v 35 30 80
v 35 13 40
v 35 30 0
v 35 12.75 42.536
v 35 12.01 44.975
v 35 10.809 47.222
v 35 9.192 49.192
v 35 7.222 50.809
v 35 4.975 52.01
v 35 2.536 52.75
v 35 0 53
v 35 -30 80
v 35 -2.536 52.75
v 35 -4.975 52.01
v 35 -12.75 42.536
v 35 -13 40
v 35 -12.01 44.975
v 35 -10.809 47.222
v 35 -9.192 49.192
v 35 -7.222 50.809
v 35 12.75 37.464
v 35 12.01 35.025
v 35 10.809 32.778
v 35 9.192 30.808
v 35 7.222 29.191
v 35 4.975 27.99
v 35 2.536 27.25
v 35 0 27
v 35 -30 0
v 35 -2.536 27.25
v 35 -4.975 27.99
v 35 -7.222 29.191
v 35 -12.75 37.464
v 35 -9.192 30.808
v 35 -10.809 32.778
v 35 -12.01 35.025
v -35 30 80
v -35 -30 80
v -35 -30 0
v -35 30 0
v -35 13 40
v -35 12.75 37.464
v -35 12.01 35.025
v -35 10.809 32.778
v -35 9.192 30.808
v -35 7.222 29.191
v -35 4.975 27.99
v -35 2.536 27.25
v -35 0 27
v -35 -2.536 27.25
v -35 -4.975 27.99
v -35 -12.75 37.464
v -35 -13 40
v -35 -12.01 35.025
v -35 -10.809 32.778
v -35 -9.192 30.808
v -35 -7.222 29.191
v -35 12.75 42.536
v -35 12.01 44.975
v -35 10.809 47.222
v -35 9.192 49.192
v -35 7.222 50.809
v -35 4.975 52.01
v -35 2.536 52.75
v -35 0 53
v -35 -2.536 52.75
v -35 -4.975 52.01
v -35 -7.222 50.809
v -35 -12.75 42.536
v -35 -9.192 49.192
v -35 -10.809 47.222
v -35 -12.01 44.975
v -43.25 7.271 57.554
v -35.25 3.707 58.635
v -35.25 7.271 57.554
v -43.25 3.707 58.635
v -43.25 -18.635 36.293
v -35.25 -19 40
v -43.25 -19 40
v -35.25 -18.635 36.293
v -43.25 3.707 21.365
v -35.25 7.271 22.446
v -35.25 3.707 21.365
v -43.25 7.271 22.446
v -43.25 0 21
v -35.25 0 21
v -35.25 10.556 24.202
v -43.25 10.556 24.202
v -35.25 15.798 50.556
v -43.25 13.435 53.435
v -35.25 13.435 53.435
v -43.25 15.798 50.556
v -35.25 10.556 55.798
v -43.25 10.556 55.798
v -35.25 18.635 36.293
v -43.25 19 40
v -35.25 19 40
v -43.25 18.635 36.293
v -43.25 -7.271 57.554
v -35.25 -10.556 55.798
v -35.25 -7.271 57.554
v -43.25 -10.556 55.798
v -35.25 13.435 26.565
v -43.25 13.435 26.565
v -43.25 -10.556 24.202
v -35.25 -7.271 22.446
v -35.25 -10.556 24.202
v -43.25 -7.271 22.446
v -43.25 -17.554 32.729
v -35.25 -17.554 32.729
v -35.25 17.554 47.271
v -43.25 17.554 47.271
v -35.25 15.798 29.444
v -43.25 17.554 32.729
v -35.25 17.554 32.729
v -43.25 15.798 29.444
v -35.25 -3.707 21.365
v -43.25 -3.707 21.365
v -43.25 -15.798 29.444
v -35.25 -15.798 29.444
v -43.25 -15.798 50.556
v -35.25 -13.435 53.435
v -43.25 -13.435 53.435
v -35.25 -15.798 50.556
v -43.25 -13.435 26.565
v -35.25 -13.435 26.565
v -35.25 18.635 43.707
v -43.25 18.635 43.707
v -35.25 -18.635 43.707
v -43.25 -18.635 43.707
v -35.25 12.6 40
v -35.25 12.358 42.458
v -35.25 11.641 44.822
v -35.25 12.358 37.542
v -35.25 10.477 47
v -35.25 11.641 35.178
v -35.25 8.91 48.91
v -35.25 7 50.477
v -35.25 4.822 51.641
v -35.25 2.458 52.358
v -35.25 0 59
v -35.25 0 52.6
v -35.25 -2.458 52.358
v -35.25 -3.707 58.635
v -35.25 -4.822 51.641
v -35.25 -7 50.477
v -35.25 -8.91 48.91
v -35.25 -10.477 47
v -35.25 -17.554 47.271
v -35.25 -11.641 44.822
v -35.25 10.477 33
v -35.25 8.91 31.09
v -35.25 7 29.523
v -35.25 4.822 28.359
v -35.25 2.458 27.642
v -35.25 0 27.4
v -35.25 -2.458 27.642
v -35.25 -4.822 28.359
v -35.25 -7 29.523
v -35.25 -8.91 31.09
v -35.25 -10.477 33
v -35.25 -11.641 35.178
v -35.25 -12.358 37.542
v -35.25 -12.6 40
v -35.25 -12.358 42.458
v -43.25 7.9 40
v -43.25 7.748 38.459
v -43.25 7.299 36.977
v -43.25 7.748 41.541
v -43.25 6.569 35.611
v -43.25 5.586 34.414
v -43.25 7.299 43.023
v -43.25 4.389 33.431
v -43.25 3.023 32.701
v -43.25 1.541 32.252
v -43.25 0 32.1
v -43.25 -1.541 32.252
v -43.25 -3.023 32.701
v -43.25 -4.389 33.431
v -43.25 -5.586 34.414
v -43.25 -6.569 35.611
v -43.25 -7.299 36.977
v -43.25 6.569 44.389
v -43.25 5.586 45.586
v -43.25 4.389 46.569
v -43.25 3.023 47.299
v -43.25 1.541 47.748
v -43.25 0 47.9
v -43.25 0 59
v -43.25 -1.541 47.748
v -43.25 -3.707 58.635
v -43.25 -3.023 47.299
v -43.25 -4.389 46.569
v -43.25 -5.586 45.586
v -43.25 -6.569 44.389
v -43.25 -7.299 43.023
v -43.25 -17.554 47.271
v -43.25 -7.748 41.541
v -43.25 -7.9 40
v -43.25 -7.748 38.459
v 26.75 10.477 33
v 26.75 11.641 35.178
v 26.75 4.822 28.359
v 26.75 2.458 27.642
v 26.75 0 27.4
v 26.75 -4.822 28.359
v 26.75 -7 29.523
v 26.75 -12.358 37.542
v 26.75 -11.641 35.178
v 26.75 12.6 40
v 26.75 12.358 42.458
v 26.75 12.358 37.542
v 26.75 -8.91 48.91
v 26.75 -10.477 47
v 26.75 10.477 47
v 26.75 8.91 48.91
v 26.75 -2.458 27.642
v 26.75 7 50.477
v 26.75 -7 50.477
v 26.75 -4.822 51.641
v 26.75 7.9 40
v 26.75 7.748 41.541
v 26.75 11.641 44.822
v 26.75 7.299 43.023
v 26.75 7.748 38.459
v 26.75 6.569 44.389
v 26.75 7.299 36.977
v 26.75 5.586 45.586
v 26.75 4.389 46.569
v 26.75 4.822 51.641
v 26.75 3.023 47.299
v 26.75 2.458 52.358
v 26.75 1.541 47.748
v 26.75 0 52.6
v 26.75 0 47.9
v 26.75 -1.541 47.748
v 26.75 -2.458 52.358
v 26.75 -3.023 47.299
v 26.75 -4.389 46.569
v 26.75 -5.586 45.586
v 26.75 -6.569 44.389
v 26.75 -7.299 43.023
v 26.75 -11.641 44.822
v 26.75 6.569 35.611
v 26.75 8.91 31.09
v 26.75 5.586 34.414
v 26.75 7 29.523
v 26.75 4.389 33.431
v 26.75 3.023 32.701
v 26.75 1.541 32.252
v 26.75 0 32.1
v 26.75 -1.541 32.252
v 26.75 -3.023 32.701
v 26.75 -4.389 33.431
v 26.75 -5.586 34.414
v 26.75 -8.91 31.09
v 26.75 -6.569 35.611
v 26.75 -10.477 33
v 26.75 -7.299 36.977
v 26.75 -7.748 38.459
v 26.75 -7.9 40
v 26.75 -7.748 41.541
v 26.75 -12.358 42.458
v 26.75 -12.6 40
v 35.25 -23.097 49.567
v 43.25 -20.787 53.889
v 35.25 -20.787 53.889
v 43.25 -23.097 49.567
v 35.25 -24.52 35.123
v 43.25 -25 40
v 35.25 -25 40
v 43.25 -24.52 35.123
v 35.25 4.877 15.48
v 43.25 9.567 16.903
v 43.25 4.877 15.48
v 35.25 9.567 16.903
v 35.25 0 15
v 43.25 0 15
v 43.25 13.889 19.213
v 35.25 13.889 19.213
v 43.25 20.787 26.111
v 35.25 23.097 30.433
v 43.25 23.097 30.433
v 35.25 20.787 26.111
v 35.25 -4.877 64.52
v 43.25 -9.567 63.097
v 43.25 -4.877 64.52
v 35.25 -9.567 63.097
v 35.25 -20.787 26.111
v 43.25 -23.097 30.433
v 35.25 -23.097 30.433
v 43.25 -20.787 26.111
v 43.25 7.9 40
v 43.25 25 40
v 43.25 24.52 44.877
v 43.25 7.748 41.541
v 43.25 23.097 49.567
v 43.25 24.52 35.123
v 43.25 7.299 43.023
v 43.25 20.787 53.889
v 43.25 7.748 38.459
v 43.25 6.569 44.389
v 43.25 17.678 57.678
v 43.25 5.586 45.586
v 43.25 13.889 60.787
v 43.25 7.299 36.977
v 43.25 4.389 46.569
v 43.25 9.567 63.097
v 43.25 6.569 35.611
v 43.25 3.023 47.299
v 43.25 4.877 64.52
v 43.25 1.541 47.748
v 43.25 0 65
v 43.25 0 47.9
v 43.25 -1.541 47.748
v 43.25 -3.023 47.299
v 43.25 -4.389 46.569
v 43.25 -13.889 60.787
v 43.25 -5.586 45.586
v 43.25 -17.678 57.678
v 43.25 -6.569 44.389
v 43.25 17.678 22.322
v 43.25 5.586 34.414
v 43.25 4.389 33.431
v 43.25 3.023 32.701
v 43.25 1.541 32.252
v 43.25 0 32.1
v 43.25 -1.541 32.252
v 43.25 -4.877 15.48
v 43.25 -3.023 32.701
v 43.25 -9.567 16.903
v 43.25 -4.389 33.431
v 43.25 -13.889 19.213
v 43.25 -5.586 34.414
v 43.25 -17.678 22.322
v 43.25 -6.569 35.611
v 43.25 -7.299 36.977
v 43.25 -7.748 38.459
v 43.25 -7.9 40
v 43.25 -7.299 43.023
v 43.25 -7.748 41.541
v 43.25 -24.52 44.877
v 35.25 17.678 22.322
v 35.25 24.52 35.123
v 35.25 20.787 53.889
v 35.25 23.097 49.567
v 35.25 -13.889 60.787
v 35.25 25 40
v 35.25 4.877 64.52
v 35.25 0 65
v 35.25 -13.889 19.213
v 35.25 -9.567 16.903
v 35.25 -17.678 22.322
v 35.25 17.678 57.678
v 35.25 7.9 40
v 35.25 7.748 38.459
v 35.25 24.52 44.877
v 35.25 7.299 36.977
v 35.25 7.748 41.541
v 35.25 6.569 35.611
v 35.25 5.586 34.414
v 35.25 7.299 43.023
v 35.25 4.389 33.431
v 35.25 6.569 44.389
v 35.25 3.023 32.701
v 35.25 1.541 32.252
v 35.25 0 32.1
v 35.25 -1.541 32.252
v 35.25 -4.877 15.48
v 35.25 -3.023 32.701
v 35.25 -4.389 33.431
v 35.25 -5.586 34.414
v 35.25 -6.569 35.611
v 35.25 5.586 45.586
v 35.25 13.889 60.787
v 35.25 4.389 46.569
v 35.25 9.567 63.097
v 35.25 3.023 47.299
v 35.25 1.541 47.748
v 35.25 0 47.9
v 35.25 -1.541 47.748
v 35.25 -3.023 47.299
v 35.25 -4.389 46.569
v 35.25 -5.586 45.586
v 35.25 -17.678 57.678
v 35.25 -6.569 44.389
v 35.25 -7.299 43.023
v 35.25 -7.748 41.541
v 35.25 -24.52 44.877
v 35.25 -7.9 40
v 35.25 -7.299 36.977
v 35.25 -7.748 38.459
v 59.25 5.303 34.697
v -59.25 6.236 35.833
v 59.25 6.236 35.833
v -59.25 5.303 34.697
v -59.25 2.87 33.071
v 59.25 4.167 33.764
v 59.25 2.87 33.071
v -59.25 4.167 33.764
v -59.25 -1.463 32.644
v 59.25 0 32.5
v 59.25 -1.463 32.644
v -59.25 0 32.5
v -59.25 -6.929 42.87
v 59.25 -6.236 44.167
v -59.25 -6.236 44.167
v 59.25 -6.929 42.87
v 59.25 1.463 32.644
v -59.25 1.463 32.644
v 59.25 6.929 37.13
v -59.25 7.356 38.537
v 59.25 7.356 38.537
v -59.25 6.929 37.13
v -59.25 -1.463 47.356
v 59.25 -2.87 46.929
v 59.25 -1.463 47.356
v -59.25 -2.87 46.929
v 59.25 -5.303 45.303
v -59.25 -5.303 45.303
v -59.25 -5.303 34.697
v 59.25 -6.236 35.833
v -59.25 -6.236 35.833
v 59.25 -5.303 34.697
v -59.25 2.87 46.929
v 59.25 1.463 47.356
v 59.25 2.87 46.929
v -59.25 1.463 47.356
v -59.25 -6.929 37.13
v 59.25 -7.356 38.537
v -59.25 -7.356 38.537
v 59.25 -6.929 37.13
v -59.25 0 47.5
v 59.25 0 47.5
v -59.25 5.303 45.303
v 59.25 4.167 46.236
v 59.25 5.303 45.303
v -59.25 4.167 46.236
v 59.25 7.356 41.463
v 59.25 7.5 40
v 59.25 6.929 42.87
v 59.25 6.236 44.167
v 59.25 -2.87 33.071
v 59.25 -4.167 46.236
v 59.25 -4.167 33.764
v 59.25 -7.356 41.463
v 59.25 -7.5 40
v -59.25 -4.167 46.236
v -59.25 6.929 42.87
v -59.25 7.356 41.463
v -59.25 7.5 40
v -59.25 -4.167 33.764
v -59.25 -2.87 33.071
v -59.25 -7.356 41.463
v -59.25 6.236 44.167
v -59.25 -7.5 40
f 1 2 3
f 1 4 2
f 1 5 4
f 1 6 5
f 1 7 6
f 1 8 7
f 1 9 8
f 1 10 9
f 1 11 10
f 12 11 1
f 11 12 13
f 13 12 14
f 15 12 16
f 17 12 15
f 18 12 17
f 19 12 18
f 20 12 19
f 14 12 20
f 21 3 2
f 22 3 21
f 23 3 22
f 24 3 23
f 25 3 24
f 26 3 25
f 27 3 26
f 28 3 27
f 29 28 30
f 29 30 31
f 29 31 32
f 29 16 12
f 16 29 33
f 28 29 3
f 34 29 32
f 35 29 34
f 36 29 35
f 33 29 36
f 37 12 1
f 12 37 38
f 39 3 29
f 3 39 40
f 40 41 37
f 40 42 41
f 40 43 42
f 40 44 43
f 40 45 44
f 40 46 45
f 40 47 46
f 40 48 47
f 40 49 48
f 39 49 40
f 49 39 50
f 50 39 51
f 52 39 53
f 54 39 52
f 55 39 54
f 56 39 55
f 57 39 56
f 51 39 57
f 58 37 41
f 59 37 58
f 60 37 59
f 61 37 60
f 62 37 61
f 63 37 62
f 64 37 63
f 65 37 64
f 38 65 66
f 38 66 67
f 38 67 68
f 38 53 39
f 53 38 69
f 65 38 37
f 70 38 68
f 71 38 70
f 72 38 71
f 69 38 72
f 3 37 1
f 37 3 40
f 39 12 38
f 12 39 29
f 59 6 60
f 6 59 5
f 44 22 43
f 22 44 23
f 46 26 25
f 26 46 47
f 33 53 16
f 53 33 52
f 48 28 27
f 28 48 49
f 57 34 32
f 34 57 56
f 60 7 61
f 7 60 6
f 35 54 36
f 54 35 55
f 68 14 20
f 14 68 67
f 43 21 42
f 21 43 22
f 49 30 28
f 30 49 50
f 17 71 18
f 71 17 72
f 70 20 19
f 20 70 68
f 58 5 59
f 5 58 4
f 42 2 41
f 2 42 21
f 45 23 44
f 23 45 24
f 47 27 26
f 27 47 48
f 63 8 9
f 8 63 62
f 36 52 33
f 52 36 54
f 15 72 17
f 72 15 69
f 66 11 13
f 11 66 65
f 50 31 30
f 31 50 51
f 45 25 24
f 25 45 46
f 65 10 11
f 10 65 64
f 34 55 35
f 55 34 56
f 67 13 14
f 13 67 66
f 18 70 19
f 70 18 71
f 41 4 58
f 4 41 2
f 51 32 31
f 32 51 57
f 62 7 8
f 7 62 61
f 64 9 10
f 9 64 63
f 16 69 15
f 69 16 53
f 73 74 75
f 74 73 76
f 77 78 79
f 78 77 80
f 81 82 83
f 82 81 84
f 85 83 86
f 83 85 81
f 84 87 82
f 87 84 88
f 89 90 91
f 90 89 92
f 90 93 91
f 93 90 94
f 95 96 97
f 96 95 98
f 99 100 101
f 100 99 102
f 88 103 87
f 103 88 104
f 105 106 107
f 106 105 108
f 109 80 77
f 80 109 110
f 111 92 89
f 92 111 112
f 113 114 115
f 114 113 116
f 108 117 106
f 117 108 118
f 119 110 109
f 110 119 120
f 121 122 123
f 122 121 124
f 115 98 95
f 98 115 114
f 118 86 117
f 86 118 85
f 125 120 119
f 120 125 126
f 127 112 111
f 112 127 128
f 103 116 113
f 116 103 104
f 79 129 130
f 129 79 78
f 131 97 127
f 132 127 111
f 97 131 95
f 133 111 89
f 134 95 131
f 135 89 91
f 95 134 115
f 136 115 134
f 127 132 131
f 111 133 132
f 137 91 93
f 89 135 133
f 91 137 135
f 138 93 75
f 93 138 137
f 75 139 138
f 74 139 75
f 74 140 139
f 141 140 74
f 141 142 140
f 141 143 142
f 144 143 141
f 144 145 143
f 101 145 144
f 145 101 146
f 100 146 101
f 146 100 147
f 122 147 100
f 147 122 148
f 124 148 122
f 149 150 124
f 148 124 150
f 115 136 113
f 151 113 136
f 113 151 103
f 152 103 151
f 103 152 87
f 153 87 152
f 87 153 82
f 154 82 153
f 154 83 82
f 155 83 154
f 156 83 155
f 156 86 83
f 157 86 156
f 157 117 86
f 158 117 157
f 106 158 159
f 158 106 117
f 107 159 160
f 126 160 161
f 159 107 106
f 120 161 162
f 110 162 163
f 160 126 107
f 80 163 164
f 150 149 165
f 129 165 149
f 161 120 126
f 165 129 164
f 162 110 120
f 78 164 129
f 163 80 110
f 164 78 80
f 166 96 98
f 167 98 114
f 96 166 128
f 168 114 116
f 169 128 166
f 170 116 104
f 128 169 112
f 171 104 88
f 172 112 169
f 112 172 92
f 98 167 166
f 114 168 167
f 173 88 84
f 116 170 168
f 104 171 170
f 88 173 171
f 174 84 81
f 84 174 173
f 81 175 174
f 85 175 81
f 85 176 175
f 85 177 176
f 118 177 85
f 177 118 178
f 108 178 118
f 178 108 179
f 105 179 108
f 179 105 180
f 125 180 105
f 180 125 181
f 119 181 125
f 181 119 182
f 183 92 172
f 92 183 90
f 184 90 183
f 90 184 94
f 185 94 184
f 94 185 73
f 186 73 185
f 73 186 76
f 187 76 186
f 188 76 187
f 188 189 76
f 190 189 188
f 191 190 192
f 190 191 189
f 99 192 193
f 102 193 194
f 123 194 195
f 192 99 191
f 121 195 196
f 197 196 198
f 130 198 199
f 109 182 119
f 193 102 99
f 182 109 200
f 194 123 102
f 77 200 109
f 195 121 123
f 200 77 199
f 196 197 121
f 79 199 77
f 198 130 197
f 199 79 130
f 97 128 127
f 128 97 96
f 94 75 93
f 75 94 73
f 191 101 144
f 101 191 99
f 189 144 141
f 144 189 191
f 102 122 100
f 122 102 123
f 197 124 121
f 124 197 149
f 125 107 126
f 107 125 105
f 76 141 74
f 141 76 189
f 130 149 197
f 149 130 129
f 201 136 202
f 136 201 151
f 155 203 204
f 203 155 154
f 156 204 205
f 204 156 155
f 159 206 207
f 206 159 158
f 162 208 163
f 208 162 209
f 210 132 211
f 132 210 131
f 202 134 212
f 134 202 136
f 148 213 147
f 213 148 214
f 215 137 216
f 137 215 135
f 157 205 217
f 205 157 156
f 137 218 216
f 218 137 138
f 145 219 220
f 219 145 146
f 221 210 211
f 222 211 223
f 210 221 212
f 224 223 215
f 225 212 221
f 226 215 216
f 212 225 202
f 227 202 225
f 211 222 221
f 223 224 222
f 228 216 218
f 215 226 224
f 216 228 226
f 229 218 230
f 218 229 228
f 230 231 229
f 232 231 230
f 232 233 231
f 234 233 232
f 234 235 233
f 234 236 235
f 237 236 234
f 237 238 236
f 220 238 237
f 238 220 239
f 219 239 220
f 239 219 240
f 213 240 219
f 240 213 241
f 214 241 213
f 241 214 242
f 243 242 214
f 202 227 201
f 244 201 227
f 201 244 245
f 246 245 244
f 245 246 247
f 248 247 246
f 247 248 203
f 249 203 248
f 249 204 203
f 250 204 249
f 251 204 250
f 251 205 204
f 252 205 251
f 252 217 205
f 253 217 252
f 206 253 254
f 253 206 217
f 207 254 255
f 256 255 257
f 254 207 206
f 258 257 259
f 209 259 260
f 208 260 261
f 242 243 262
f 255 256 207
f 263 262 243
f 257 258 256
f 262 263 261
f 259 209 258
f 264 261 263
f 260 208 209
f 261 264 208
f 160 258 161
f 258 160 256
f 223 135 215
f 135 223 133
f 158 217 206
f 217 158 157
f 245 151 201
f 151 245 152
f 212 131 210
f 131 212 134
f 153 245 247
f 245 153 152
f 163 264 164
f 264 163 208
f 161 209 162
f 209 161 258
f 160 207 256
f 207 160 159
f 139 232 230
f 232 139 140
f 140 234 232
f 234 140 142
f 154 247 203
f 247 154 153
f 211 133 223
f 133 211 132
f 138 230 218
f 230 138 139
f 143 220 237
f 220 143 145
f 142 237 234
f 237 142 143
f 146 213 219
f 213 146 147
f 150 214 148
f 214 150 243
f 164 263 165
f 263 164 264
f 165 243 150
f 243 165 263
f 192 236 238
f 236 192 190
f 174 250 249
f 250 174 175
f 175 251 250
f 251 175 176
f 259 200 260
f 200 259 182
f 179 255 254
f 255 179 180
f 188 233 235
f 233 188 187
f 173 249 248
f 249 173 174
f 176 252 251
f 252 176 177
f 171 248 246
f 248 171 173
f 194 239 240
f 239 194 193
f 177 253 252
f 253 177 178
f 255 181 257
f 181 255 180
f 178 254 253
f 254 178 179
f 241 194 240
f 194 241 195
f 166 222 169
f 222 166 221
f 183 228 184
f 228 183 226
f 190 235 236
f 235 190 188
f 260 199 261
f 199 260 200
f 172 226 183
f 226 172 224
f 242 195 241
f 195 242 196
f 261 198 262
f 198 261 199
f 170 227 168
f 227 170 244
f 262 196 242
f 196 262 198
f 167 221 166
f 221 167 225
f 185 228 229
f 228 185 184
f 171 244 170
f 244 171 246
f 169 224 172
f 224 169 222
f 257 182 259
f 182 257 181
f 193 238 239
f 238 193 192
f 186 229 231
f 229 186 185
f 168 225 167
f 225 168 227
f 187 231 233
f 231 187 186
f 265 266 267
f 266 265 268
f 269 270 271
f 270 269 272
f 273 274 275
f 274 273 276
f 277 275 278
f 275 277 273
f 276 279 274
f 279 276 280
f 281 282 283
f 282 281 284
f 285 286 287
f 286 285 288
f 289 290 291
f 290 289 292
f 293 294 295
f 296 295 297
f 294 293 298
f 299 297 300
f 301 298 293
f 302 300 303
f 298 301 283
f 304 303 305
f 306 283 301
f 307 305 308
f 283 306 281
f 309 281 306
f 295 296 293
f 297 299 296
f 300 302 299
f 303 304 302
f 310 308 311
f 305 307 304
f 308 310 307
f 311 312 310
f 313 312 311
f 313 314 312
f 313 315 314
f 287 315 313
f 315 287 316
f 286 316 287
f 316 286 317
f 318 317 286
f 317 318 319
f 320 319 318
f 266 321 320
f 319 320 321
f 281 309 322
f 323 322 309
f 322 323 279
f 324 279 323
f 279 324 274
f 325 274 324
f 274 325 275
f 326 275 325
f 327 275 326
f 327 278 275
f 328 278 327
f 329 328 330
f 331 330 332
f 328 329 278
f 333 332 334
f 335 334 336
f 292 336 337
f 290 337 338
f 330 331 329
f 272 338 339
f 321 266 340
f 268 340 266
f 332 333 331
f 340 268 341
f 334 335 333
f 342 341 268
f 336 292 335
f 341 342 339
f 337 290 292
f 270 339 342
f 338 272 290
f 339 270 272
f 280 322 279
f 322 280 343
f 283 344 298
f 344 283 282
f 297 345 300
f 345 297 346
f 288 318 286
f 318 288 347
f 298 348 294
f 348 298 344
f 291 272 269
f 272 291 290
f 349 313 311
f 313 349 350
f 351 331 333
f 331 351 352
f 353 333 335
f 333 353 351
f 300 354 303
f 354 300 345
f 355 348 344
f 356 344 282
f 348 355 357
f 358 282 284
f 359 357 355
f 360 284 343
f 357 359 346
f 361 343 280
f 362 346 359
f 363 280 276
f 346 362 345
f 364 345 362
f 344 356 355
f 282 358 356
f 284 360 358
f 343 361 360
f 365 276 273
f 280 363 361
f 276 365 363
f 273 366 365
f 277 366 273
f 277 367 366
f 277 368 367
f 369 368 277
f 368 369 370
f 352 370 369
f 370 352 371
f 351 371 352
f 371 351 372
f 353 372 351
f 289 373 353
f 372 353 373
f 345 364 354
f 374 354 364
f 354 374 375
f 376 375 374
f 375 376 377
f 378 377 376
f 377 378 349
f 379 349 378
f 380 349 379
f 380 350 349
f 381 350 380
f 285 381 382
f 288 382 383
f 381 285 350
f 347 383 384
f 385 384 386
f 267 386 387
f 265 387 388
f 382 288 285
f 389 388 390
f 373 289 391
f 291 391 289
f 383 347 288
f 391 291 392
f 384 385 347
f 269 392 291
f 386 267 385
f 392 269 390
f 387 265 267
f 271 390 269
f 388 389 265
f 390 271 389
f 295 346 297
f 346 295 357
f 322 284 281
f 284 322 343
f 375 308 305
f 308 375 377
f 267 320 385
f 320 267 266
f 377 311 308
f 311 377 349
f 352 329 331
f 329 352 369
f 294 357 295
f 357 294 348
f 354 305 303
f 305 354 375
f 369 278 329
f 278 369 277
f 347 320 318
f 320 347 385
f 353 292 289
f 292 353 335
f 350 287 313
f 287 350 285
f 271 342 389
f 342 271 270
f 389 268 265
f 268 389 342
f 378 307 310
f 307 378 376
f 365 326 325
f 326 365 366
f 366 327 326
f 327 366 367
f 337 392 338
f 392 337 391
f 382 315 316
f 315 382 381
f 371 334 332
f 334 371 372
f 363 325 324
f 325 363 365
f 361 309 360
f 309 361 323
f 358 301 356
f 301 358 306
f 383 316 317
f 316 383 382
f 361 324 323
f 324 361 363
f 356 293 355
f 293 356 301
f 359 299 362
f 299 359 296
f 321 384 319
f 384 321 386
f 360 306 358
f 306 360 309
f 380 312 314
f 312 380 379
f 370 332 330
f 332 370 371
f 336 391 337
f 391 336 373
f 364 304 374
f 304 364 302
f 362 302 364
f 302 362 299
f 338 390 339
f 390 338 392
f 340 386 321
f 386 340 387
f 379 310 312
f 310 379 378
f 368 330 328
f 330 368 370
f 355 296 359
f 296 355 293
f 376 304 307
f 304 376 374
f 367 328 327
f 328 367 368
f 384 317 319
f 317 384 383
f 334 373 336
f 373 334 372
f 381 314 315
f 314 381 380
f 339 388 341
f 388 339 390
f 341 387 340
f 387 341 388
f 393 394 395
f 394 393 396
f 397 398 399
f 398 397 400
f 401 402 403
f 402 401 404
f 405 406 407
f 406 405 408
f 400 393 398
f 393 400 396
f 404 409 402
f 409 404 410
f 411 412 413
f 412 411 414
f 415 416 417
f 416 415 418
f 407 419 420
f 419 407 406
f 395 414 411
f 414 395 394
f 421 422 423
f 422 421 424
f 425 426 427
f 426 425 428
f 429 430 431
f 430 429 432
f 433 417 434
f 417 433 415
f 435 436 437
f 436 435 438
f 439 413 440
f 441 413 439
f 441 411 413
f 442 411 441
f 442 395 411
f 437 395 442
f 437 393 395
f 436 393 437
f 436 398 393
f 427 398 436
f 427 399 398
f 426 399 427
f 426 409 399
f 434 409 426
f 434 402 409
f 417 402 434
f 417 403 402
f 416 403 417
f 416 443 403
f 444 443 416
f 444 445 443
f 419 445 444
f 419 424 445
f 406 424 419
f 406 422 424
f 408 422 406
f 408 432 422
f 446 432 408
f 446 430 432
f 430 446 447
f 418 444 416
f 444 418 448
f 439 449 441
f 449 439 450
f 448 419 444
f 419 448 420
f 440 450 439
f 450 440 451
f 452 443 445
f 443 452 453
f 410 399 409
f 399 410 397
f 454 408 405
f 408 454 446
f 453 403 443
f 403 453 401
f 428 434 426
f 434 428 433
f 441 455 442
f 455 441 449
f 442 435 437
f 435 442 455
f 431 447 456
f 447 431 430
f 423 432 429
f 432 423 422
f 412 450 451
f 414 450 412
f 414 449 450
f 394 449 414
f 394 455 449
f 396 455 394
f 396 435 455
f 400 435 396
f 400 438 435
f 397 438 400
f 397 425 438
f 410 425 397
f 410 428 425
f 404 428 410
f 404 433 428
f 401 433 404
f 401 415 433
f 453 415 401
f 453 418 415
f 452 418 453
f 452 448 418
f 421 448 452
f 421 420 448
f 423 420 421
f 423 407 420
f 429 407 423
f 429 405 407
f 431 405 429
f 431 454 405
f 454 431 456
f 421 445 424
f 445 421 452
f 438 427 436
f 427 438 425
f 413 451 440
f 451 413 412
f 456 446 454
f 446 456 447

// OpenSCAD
$fn = 32;

// ------------------------------------------------------------------------
// Bushed housing: 70 x 60 x 80 mm housing, bushing d25.2
// Every part is its own module, assembly() places them once.
// ------------------------------------------------------------------------

// --- part 1 ---
module housing() {
  difference() {
    translate([-35, -30, 0]) cube([70, 60, 80]);
    translate([0, 0, 40]) rotate([0, 90, 0]) cylinder(h = 72, d = 26, center = true);
  }
}

// --- part 2 ---
module bushing() {
  difference() {
    union() {
      cylinder(h = 8, d = 38);
      translate([0, 0, 8]) cylinder(h = 62, d = 25.2);
    }
    translate([0, 0, -1]) cylinder(h = 72, d = 15.8);
  }
}

// --- part 3 ---
module shaft() {
  translate([0, 0, -59.25]) cylinder(h = 118.5, d = 15);
}

// --- part 4 ---
module cover() {
  difference() {
    cylinder(h = 8, d = 50);
    translate([0, 0, -1]) cylinder(h = 10, d = 15.8);
  }
}

// --- assembly ---
module assembly() {
  translate([0, 0, 0]) rotate([0, 0, 0]) housing();
  translate([-43.25, 0, 40]) rotate([0, 90, 0]) bushing();
  translate([0, 0, 40]) rotate([0, 90, 0]) shaft();
  translate([35.25, 0, 40]) rotate([0, 90, 0]) cover();
}

assembly();
